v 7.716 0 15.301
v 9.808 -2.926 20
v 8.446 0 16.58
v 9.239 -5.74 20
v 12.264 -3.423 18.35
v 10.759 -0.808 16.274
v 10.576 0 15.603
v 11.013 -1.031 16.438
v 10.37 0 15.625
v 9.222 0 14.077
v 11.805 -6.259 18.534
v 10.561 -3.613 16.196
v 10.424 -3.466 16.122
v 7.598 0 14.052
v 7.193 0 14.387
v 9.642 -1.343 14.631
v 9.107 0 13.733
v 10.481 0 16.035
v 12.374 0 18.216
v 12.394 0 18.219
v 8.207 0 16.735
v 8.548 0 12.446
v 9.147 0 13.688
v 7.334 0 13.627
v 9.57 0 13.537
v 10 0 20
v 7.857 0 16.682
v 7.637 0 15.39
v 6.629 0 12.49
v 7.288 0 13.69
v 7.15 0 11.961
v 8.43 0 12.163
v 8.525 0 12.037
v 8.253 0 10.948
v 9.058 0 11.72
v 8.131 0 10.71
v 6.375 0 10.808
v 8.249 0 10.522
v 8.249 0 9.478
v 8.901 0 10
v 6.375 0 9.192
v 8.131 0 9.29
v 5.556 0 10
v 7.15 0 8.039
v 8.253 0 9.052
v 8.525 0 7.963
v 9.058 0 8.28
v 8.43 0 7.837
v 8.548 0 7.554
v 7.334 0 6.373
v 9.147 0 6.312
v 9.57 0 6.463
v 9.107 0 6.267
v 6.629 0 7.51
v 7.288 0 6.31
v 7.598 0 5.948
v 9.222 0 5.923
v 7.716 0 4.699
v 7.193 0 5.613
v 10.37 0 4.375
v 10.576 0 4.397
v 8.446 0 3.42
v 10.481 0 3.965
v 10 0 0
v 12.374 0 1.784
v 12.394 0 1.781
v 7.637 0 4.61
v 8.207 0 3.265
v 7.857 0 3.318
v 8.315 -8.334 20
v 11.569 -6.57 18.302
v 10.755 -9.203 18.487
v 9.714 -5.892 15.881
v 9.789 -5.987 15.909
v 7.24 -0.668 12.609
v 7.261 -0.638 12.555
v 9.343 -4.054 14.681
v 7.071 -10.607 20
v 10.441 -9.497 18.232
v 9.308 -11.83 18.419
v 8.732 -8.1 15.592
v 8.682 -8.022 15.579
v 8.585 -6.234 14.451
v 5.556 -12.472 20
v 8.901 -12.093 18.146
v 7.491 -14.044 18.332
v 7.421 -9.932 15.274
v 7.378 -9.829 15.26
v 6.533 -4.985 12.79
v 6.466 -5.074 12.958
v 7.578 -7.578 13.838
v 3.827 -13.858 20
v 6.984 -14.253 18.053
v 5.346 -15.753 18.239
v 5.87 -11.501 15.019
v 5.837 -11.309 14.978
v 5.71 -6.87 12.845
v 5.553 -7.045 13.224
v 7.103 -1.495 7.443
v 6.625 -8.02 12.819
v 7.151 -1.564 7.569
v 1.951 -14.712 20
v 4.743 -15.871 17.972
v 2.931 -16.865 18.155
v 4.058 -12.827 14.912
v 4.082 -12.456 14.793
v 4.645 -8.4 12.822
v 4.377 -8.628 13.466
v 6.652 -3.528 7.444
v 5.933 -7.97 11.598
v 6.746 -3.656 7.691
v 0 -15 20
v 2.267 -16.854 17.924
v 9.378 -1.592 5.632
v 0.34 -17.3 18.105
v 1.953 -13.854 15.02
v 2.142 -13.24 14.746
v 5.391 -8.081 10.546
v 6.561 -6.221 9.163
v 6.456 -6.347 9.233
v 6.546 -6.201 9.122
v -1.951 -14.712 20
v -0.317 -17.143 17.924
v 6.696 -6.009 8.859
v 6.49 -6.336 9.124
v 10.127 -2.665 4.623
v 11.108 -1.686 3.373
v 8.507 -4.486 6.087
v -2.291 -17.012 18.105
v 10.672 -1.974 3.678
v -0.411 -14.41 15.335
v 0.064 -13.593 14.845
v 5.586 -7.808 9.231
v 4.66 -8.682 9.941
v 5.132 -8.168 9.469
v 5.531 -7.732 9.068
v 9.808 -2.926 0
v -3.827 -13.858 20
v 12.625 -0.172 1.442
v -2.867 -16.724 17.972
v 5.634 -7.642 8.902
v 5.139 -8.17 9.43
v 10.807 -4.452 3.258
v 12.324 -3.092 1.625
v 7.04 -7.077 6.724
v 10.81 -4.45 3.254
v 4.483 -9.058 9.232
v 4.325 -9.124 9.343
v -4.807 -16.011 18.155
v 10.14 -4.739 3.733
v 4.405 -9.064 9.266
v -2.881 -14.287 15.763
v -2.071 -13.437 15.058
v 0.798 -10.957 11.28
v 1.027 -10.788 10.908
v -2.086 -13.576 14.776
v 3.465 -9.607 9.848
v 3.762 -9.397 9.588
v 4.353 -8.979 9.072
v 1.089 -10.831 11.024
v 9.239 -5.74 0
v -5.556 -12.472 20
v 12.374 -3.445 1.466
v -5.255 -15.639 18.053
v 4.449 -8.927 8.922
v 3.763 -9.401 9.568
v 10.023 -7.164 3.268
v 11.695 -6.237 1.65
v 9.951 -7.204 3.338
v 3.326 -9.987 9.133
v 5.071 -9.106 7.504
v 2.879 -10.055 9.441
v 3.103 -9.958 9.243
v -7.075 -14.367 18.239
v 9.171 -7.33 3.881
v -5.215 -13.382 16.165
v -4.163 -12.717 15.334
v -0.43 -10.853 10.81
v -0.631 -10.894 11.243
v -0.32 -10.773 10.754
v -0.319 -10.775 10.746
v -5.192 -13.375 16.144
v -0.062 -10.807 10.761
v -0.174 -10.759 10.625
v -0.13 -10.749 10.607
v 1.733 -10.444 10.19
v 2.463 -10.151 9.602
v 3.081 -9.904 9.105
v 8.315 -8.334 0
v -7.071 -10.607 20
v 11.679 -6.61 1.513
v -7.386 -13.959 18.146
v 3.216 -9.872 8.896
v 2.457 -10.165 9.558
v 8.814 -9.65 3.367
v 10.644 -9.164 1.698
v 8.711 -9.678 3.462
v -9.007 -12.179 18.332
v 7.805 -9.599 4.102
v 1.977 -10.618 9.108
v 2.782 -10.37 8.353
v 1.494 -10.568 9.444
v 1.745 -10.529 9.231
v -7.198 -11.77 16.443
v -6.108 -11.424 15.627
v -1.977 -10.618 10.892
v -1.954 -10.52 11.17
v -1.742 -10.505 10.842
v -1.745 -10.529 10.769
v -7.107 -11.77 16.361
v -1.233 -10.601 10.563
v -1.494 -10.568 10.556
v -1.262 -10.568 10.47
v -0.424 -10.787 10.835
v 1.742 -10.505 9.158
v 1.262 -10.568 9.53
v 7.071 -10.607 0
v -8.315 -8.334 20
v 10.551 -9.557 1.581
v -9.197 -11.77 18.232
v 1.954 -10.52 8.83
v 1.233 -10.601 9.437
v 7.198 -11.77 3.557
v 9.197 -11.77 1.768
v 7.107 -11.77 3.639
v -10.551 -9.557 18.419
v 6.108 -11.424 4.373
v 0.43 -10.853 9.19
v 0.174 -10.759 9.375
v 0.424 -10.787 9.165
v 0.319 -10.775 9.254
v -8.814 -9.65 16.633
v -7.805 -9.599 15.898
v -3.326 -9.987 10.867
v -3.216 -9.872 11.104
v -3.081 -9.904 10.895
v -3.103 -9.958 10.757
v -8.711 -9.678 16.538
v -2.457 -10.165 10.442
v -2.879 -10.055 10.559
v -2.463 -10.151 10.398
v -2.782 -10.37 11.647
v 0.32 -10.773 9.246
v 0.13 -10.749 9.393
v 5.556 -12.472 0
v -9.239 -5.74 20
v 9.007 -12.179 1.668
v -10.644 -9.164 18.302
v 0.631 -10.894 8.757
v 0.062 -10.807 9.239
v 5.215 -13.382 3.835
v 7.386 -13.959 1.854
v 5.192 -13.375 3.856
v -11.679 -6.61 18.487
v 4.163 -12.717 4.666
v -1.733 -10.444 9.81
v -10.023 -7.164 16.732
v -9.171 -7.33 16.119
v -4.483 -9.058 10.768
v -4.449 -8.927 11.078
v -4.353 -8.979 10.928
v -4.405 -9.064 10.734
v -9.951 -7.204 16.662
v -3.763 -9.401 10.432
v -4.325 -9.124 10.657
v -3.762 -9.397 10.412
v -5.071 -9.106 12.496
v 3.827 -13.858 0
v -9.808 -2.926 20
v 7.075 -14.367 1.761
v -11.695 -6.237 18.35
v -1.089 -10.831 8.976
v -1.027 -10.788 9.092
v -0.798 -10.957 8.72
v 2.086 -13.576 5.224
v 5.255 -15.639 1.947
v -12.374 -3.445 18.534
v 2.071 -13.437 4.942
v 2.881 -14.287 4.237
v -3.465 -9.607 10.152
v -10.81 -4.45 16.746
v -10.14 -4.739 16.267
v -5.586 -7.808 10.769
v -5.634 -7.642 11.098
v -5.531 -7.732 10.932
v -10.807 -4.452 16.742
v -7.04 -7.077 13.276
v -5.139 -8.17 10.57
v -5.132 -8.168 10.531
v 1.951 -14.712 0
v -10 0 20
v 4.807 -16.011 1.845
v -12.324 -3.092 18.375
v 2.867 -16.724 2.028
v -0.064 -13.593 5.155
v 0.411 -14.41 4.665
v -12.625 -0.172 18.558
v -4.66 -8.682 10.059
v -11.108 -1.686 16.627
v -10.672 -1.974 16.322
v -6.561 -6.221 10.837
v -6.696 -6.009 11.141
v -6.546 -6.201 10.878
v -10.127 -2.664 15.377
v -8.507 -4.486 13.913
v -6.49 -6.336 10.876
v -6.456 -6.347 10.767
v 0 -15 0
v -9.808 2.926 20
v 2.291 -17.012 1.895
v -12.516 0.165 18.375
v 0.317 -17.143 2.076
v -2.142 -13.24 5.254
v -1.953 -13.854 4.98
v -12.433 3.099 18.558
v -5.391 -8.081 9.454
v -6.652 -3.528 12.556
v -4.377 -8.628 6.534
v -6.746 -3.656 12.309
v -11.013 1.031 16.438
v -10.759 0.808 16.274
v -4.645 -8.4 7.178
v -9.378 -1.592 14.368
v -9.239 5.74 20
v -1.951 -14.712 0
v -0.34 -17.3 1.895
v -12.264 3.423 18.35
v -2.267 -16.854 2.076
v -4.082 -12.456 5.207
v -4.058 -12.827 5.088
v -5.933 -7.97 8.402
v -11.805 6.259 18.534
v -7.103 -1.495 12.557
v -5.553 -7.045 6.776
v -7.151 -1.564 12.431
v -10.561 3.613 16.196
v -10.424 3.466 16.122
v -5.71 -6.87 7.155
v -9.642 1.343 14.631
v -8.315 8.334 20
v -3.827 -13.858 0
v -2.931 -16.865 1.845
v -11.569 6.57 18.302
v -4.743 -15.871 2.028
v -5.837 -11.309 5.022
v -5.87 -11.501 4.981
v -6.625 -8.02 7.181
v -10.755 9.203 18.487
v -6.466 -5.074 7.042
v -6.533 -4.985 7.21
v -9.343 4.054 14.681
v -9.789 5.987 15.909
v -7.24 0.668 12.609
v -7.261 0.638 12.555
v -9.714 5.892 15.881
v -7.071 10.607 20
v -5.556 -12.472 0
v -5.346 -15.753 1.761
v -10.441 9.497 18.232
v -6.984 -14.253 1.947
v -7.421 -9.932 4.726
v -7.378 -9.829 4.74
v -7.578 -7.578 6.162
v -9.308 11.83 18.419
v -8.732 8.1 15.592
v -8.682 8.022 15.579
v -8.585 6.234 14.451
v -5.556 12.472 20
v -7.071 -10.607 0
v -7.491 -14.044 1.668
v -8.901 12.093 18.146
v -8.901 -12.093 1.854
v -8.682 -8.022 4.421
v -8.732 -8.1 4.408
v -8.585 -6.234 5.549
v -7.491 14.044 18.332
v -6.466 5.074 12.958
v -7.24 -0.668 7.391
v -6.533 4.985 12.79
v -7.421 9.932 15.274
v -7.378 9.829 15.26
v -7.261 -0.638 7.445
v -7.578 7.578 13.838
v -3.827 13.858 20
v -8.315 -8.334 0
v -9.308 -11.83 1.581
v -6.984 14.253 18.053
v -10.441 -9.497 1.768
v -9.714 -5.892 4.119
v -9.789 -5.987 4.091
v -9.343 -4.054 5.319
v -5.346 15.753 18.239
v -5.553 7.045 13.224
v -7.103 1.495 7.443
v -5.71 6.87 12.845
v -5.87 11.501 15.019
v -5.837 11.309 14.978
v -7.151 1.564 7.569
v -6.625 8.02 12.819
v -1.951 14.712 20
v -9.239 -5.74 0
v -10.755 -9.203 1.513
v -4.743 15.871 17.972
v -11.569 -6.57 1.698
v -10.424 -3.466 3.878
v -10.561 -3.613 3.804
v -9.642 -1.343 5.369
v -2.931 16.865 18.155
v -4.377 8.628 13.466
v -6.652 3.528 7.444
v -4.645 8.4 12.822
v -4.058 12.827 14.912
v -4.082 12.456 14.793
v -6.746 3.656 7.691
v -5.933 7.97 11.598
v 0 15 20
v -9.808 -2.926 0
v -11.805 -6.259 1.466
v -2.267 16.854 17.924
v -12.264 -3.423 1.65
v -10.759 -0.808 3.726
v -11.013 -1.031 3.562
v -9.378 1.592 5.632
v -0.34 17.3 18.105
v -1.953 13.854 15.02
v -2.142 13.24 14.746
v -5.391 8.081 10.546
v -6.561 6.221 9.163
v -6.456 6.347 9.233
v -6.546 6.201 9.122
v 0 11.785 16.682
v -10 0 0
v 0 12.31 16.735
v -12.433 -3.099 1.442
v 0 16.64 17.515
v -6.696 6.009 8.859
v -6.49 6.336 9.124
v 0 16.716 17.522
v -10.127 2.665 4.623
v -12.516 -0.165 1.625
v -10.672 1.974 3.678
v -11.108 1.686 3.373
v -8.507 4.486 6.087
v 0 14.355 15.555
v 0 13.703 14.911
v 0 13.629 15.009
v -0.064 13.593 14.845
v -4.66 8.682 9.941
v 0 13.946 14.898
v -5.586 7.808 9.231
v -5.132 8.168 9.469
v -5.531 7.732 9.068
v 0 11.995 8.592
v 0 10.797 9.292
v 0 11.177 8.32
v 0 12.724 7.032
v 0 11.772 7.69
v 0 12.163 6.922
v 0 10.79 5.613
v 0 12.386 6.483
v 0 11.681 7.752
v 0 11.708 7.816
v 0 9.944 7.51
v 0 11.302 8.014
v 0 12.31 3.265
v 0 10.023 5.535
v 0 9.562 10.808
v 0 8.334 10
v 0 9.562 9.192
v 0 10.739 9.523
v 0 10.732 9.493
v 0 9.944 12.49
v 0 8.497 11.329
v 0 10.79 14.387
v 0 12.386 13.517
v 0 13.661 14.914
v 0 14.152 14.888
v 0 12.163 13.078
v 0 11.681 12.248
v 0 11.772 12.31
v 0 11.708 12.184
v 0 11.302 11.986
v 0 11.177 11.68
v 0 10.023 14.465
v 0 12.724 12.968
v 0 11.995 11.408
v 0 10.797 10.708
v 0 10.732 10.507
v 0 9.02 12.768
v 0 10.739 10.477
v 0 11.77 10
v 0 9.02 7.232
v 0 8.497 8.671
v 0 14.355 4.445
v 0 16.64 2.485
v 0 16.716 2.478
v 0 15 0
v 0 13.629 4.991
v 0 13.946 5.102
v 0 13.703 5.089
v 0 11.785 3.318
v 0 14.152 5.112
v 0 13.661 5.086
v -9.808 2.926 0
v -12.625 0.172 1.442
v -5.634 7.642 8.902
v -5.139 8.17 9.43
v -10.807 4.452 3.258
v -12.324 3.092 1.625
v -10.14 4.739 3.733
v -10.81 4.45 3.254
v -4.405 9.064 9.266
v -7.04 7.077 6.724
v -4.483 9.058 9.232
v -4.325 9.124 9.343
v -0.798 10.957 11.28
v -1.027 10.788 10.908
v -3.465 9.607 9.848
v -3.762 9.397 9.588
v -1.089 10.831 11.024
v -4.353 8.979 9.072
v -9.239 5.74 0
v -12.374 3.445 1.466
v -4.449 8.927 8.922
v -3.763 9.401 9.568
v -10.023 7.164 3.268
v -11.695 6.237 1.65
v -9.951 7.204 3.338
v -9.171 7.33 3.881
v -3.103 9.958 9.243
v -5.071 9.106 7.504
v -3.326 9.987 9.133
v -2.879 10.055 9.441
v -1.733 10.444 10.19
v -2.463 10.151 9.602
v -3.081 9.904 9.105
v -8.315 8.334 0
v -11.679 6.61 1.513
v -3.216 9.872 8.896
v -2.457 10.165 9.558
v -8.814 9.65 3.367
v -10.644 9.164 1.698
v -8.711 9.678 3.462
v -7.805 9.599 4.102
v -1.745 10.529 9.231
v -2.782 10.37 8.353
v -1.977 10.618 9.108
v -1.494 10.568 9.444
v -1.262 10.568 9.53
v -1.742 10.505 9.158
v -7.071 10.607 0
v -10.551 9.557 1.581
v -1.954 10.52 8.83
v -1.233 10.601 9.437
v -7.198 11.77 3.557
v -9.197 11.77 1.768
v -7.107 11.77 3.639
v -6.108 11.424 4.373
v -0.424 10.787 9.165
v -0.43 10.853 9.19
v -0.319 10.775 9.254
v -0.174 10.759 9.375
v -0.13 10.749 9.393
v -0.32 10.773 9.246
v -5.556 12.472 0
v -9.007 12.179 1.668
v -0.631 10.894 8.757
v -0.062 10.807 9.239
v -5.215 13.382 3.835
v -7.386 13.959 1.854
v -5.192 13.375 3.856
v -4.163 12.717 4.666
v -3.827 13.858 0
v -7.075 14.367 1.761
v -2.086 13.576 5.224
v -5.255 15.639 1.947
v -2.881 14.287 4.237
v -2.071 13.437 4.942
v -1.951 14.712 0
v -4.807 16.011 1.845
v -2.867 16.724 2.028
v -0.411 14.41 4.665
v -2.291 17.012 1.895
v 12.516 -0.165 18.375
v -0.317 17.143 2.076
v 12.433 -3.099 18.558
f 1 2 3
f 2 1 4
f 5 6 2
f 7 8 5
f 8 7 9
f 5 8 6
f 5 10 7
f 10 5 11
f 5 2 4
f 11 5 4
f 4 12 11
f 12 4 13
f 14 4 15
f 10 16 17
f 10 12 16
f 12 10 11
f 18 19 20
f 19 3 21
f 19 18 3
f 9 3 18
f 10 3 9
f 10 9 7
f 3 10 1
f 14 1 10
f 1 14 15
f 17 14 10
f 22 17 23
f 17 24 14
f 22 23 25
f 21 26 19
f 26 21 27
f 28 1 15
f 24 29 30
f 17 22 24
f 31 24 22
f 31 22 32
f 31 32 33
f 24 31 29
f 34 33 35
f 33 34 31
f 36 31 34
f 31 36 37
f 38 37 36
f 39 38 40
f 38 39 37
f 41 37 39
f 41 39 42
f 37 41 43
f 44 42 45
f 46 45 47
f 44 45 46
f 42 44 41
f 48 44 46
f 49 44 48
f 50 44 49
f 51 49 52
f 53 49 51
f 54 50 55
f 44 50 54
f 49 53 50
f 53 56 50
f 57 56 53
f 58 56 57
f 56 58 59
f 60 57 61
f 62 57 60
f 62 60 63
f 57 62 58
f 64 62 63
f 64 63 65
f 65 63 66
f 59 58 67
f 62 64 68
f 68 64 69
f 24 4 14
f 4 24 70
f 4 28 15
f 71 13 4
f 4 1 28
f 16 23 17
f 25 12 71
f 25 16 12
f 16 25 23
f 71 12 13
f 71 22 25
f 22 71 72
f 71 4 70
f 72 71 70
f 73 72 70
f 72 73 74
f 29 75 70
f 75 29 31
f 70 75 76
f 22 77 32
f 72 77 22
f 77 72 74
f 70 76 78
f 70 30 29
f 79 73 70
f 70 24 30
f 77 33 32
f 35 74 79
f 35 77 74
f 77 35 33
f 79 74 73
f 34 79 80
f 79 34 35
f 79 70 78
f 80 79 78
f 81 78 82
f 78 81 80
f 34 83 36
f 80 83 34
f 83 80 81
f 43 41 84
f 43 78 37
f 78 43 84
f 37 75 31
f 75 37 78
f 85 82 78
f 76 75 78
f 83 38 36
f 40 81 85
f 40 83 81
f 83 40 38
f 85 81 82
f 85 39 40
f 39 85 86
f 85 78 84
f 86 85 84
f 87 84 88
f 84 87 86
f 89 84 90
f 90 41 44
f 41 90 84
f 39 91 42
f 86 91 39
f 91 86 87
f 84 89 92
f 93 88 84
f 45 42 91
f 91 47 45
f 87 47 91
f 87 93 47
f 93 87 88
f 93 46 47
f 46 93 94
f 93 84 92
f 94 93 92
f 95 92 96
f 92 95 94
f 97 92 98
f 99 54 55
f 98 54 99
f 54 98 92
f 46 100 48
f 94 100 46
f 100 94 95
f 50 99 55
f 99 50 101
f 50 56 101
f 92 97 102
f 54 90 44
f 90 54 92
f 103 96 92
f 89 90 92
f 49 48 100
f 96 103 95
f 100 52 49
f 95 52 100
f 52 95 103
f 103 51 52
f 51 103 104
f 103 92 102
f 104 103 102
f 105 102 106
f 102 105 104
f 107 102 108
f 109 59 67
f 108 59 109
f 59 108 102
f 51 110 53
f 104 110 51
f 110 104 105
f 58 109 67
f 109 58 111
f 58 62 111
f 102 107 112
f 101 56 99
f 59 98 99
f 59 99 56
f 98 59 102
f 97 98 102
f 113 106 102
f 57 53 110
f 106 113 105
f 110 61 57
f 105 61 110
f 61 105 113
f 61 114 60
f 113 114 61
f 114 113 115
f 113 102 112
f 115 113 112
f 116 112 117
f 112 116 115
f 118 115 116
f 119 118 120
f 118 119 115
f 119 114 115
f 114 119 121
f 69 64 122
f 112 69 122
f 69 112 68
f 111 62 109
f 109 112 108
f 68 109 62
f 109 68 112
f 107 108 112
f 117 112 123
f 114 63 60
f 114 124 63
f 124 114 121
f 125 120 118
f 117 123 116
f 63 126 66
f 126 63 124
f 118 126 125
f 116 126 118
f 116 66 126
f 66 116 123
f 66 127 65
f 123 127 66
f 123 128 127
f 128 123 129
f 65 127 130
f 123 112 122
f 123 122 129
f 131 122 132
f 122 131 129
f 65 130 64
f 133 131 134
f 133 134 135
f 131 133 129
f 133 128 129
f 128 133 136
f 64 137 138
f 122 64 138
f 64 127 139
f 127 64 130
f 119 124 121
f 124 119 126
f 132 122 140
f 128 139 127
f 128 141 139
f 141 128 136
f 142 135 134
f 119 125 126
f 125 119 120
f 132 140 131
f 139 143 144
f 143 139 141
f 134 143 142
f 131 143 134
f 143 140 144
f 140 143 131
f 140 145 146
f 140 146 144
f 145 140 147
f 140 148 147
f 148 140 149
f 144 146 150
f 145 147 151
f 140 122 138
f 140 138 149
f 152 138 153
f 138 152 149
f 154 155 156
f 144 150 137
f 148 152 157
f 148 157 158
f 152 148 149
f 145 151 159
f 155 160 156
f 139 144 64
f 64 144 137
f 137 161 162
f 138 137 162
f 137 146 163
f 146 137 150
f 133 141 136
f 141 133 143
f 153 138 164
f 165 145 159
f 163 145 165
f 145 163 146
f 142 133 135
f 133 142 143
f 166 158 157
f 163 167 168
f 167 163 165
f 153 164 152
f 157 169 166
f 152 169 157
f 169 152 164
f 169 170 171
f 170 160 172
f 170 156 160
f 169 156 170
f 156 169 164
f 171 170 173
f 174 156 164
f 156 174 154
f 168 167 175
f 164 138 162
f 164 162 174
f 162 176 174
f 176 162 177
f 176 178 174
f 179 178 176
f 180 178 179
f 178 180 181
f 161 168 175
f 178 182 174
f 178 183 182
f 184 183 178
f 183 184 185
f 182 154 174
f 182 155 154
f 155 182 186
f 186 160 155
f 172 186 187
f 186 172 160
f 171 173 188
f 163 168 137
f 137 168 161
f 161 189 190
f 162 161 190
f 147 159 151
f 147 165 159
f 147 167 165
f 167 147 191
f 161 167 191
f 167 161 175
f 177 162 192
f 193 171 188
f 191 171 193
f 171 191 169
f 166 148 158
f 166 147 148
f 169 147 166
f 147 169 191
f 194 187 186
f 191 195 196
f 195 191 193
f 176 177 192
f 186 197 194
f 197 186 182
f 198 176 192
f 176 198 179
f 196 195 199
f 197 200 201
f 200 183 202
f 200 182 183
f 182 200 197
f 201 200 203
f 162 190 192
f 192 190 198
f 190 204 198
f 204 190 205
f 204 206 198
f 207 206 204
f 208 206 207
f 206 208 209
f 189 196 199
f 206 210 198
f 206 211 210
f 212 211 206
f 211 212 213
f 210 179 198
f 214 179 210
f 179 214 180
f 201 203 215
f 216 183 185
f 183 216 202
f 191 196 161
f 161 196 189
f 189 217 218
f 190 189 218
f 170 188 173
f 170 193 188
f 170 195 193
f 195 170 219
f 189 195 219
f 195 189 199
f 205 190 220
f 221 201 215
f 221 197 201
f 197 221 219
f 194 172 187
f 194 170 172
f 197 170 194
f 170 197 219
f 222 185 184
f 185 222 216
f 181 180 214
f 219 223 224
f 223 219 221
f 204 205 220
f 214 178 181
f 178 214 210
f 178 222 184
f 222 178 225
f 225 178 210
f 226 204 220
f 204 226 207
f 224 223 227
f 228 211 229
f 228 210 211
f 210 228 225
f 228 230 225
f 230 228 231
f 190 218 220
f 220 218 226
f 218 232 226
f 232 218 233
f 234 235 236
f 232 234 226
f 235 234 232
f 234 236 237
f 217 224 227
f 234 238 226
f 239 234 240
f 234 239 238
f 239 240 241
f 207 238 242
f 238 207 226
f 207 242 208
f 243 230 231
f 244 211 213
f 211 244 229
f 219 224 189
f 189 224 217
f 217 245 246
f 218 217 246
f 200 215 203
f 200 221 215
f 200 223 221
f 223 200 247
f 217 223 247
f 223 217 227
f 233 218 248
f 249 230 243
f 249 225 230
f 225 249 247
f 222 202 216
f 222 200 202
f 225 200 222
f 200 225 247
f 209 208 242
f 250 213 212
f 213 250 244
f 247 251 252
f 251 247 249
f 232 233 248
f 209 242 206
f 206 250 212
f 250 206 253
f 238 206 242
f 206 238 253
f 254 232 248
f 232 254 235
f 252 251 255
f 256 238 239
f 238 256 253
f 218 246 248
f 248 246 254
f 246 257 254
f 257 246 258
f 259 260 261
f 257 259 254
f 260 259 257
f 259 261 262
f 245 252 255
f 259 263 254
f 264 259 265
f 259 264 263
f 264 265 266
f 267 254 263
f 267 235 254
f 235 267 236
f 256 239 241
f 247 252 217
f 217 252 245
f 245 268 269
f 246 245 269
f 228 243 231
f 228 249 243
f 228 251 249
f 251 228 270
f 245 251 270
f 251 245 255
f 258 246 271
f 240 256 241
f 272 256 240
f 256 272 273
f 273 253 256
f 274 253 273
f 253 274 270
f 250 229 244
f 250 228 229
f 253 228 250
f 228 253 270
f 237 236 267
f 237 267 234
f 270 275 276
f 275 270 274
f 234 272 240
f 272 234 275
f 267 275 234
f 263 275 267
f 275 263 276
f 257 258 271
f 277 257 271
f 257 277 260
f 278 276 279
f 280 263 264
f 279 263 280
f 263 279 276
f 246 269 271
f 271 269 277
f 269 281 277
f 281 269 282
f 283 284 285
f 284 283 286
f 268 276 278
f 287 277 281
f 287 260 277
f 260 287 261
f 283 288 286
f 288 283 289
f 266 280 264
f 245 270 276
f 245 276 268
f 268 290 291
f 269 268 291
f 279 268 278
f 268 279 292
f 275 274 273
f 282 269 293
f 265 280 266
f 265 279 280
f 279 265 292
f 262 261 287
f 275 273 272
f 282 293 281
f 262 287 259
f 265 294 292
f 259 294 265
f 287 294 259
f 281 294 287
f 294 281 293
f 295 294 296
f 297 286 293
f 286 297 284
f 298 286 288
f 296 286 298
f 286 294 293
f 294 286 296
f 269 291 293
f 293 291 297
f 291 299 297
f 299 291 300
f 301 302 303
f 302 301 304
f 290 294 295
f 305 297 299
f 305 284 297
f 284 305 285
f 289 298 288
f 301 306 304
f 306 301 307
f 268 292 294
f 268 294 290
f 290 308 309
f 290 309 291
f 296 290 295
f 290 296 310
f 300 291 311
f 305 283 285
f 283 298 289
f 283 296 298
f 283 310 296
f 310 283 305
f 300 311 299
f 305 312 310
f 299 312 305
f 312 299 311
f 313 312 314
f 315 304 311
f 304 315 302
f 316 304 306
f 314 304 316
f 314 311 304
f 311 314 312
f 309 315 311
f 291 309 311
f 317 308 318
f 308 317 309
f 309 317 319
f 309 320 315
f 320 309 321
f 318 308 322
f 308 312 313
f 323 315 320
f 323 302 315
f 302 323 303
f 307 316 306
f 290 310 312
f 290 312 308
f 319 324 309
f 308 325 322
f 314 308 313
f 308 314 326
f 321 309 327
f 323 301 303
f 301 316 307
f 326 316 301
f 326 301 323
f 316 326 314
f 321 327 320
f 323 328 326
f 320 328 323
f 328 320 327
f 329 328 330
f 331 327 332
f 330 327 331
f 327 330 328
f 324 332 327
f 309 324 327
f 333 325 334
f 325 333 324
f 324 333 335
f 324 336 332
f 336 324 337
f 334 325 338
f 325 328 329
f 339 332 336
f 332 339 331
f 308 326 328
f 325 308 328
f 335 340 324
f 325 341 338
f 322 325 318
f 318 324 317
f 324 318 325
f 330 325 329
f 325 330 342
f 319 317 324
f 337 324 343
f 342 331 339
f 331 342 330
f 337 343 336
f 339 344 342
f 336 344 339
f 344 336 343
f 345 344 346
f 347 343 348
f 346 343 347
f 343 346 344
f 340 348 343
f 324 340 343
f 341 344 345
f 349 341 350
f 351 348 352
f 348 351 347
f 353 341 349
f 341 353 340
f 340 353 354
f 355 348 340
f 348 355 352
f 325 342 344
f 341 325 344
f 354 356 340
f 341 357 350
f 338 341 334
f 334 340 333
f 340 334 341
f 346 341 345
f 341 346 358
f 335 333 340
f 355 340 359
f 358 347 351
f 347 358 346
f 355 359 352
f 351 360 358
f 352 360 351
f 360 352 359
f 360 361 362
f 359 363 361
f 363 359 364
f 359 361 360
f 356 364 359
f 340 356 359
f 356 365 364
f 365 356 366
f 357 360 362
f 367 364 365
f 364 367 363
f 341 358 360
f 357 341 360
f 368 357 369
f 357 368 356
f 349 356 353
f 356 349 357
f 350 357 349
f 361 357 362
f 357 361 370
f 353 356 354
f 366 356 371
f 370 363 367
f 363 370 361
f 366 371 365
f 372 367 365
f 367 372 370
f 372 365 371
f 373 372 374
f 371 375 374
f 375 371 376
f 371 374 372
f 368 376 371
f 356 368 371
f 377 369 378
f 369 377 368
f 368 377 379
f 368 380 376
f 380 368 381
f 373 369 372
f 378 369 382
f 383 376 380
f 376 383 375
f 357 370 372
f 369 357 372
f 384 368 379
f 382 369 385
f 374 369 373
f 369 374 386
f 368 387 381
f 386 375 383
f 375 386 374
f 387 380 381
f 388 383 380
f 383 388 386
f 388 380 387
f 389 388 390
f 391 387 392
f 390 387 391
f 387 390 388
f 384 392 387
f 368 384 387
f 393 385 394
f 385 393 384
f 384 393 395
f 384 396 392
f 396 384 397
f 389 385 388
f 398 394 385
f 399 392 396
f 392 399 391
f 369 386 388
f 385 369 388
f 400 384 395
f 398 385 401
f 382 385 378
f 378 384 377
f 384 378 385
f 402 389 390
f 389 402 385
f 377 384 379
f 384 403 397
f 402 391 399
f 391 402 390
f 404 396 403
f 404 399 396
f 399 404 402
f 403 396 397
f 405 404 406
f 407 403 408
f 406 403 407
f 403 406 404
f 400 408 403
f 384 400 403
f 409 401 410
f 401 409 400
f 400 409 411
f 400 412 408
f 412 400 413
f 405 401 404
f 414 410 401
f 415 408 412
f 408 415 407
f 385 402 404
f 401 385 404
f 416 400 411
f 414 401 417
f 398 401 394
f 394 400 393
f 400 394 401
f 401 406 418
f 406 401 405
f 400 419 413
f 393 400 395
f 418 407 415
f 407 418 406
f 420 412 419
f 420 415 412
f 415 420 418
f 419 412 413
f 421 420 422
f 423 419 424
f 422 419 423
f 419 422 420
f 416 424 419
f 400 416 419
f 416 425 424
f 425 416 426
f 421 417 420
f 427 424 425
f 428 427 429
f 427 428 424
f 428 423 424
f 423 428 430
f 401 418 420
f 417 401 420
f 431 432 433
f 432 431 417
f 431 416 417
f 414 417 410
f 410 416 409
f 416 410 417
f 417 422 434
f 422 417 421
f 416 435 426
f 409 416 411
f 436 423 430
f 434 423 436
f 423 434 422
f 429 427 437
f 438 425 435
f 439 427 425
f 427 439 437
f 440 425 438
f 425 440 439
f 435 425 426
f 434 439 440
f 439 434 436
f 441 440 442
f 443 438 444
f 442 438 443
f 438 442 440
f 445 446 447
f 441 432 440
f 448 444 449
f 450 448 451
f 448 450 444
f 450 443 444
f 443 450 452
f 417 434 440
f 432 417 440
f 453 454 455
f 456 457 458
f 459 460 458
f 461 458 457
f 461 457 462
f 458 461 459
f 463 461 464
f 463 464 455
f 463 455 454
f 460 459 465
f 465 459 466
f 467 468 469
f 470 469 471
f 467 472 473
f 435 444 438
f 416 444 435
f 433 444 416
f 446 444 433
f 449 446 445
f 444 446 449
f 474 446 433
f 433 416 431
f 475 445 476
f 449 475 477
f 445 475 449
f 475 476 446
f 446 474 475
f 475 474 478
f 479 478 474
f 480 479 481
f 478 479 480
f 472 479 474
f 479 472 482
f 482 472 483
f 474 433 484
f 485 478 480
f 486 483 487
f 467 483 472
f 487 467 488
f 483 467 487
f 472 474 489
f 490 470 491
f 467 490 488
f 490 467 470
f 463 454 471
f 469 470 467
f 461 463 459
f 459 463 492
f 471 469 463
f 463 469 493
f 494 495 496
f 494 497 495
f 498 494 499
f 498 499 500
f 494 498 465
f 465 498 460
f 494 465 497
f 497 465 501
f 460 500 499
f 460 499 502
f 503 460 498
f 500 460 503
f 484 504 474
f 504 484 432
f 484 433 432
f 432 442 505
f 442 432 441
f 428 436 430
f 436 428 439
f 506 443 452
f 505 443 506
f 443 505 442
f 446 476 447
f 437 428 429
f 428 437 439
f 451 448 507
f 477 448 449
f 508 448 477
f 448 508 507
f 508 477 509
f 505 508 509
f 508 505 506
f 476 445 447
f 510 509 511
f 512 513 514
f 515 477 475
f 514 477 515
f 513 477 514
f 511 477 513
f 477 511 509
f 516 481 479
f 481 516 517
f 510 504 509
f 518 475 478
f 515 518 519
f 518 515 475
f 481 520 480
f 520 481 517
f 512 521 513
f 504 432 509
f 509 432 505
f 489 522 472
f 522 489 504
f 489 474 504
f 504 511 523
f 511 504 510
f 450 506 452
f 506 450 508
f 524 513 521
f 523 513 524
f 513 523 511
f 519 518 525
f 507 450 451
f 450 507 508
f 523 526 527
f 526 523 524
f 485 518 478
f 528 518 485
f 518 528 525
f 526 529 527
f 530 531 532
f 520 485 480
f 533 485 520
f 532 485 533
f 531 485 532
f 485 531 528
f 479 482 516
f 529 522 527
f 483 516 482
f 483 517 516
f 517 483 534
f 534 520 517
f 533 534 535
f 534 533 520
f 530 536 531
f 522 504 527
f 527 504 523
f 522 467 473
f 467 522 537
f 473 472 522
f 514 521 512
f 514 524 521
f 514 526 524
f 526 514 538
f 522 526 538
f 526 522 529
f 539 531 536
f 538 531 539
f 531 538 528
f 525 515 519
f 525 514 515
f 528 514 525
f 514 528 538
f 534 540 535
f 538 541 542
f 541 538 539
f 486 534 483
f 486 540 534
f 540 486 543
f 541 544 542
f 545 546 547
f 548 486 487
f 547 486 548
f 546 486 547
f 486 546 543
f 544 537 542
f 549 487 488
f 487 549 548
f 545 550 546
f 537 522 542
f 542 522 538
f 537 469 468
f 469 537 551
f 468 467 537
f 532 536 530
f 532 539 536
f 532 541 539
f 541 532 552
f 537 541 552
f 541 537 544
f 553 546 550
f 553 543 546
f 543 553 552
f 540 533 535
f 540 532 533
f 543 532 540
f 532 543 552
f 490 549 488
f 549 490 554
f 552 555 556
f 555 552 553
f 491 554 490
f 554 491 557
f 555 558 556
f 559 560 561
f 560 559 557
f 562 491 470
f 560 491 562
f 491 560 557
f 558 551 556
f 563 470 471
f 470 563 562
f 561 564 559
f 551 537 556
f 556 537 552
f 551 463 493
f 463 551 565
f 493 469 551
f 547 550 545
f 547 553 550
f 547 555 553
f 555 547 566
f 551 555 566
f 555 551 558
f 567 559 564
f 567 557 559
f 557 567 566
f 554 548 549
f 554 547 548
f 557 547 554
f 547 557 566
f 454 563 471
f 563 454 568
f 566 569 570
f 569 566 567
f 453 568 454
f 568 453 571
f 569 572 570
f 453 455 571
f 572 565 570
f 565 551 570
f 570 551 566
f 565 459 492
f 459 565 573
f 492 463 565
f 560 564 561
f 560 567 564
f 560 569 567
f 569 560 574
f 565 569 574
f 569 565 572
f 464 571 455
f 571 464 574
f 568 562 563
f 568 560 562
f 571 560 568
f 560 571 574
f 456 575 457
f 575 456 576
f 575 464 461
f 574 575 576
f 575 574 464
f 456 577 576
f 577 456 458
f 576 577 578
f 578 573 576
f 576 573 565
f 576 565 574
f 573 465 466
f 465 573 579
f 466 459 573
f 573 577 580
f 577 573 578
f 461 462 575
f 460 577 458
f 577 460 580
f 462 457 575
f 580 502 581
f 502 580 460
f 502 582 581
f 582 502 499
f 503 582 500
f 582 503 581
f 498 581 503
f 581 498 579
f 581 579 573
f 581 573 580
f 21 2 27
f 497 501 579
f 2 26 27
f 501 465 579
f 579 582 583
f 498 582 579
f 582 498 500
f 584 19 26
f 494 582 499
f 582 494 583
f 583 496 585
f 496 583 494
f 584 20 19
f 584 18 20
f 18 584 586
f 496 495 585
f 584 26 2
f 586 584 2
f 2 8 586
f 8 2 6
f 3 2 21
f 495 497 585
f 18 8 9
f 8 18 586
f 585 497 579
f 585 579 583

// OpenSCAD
n = 32;

function psin (i) = sin(360*i/n);
function pcos (i) = 1.5*cos(360*i/n);

function twist (i) = (i + 9) % n;
function top (i) = [10*psin(twist(i)), 10*pcos(twist(i)), 20];
function bot (i) = [10*psin(i), 10*pcos(i), 0];

function xp (a, b, c) = 
    let (w = cross(a-b, c-b))
    -3 *  w / norm(w) + b;

module slab(i) {
    // outside (bottom)
    o0 = bot(i);
    o1 = top(i);
    o2 = top(i+1);
    o3 = bot(i+1);
    CubePoints = [
        o0, o1, o2, o3,
        xp(o3, o0, o1),
        xp(o0, o1, o2),
        xp(o1, o2, o3),
        xp(o2, o3, o0)
    ];
    CubeFaces = [
        [0,1,2,3],  // bottom
        [4,5,1,0],  // front
        [7,6,5,4],  // top
        [5,6,2,1],  // right
        [6,7,3,2],  // back
        [7,4,0,3]]; // left
    difference() {
        polyhedron( CubePoints, CubeFaces );
        cube(20);
    }
}

module fairing () {
    for (i = [0:n]) {
        slab(i);
    }
}

fairing();
